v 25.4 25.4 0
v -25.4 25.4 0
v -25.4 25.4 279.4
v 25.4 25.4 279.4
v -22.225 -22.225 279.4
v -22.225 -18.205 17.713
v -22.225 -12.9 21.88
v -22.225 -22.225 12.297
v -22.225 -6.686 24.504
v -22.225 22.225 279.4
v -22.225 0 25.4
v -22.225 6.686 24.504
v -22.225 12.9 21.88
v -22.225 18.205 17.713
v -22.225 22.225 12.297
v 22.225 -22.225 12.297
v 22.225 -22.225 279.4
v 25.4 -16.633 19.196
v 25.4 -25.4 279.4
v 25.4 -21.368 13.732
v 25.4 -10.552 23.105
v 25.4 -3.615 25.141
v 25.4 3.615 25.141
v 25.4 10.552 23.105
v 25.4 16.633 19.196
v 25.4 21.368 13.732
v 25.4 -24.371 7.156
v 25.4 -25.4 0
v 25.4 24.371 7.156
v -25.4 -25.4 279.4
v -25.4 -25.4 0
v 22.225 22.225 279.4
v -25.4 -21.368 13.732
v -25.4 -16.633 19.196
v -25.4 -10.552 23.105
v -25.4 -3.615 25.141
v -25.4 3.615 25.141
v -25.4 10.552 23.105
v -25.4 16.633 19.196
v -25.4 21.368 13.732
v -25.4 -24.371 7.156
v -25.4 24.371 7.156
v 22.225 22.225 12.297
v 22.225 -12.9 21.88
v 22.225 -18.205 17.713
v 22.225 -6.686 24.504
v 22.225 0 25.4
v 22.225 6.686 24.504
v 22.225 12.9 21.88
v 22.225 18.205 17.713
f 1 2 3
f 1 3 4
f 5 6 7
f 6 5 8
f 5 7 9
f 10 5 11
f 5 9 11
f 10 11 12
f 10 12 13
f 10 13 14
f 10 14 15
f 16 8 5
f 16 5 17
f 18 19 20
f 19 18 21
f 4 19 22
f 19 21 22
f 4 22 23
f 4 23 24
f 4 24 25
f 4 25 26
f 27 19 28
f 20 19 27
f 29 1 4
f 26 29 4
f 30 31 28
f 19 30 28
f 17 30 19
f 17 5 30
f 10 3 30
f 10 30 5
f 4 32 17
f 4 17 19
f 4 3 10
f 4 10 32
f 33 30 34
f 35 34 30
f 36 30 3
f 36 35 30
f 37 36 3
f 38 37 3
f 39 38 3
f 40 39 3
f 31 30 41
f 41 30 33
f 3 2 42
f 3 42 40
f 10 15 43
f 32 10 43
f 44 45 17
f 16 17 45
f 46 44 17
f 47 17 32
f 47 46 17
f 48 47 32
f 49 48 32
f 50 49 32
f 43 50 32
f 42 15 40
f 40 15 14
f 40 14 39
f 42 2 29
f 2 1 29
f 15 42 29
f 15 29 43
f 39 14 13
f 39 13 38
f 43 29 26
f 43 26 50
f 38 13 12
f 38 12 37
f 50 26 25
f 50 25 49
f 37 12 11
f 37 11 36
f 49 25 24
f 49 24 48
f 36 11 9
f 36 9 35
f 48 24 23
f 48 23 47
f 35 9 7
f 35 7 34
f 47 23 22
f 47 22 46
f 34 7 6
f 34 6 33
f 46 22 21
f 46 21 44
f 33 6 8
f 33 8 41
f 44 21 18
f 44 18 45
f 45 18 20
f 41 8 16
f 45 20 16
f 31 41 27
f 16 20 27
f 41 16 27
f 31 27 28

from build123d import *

# Parameters (mm, degrees)
SKETCH1_W           = 50.8
SKETCH1_H           = 50.8
SKETCH1_W_2         = 44.45
SKETCH1_H_2         = 44.45
BOSS_EXTRUDE1_DEPTH = 279.4
SKETCH2_R           = 25.4
CUT_EXTRUDE1_DEPTH  = 139.7


with BuildPart() as part:
    # Sketch1 → Boss-Extrude1 (new body)
    with BuildSketch(Plane.XY):
        Rectangle(SKETCH1_W, SKETCH1_H)
        Rectangle(SKETCH1_W_2, SKETCH1_H_2, mode=Mode.SUBTRACT)
    extrude(amount=BOSS_EXTRUDE1_DEPTH)

    # Sketch2 → Cut-Extrude1 (cut, symmetric)
    with BuildSketch(Plane(origin=(0, 0, 0), x_dir=(0, 0, -1), z_dir=(1, 0, 0))):
        Circle(SKETCH2_R)
    extrude(amount=CUT_EXTRUDE1_DEPTH, both=True, mode=Mode.SUBTRACT)


solid = part.part
